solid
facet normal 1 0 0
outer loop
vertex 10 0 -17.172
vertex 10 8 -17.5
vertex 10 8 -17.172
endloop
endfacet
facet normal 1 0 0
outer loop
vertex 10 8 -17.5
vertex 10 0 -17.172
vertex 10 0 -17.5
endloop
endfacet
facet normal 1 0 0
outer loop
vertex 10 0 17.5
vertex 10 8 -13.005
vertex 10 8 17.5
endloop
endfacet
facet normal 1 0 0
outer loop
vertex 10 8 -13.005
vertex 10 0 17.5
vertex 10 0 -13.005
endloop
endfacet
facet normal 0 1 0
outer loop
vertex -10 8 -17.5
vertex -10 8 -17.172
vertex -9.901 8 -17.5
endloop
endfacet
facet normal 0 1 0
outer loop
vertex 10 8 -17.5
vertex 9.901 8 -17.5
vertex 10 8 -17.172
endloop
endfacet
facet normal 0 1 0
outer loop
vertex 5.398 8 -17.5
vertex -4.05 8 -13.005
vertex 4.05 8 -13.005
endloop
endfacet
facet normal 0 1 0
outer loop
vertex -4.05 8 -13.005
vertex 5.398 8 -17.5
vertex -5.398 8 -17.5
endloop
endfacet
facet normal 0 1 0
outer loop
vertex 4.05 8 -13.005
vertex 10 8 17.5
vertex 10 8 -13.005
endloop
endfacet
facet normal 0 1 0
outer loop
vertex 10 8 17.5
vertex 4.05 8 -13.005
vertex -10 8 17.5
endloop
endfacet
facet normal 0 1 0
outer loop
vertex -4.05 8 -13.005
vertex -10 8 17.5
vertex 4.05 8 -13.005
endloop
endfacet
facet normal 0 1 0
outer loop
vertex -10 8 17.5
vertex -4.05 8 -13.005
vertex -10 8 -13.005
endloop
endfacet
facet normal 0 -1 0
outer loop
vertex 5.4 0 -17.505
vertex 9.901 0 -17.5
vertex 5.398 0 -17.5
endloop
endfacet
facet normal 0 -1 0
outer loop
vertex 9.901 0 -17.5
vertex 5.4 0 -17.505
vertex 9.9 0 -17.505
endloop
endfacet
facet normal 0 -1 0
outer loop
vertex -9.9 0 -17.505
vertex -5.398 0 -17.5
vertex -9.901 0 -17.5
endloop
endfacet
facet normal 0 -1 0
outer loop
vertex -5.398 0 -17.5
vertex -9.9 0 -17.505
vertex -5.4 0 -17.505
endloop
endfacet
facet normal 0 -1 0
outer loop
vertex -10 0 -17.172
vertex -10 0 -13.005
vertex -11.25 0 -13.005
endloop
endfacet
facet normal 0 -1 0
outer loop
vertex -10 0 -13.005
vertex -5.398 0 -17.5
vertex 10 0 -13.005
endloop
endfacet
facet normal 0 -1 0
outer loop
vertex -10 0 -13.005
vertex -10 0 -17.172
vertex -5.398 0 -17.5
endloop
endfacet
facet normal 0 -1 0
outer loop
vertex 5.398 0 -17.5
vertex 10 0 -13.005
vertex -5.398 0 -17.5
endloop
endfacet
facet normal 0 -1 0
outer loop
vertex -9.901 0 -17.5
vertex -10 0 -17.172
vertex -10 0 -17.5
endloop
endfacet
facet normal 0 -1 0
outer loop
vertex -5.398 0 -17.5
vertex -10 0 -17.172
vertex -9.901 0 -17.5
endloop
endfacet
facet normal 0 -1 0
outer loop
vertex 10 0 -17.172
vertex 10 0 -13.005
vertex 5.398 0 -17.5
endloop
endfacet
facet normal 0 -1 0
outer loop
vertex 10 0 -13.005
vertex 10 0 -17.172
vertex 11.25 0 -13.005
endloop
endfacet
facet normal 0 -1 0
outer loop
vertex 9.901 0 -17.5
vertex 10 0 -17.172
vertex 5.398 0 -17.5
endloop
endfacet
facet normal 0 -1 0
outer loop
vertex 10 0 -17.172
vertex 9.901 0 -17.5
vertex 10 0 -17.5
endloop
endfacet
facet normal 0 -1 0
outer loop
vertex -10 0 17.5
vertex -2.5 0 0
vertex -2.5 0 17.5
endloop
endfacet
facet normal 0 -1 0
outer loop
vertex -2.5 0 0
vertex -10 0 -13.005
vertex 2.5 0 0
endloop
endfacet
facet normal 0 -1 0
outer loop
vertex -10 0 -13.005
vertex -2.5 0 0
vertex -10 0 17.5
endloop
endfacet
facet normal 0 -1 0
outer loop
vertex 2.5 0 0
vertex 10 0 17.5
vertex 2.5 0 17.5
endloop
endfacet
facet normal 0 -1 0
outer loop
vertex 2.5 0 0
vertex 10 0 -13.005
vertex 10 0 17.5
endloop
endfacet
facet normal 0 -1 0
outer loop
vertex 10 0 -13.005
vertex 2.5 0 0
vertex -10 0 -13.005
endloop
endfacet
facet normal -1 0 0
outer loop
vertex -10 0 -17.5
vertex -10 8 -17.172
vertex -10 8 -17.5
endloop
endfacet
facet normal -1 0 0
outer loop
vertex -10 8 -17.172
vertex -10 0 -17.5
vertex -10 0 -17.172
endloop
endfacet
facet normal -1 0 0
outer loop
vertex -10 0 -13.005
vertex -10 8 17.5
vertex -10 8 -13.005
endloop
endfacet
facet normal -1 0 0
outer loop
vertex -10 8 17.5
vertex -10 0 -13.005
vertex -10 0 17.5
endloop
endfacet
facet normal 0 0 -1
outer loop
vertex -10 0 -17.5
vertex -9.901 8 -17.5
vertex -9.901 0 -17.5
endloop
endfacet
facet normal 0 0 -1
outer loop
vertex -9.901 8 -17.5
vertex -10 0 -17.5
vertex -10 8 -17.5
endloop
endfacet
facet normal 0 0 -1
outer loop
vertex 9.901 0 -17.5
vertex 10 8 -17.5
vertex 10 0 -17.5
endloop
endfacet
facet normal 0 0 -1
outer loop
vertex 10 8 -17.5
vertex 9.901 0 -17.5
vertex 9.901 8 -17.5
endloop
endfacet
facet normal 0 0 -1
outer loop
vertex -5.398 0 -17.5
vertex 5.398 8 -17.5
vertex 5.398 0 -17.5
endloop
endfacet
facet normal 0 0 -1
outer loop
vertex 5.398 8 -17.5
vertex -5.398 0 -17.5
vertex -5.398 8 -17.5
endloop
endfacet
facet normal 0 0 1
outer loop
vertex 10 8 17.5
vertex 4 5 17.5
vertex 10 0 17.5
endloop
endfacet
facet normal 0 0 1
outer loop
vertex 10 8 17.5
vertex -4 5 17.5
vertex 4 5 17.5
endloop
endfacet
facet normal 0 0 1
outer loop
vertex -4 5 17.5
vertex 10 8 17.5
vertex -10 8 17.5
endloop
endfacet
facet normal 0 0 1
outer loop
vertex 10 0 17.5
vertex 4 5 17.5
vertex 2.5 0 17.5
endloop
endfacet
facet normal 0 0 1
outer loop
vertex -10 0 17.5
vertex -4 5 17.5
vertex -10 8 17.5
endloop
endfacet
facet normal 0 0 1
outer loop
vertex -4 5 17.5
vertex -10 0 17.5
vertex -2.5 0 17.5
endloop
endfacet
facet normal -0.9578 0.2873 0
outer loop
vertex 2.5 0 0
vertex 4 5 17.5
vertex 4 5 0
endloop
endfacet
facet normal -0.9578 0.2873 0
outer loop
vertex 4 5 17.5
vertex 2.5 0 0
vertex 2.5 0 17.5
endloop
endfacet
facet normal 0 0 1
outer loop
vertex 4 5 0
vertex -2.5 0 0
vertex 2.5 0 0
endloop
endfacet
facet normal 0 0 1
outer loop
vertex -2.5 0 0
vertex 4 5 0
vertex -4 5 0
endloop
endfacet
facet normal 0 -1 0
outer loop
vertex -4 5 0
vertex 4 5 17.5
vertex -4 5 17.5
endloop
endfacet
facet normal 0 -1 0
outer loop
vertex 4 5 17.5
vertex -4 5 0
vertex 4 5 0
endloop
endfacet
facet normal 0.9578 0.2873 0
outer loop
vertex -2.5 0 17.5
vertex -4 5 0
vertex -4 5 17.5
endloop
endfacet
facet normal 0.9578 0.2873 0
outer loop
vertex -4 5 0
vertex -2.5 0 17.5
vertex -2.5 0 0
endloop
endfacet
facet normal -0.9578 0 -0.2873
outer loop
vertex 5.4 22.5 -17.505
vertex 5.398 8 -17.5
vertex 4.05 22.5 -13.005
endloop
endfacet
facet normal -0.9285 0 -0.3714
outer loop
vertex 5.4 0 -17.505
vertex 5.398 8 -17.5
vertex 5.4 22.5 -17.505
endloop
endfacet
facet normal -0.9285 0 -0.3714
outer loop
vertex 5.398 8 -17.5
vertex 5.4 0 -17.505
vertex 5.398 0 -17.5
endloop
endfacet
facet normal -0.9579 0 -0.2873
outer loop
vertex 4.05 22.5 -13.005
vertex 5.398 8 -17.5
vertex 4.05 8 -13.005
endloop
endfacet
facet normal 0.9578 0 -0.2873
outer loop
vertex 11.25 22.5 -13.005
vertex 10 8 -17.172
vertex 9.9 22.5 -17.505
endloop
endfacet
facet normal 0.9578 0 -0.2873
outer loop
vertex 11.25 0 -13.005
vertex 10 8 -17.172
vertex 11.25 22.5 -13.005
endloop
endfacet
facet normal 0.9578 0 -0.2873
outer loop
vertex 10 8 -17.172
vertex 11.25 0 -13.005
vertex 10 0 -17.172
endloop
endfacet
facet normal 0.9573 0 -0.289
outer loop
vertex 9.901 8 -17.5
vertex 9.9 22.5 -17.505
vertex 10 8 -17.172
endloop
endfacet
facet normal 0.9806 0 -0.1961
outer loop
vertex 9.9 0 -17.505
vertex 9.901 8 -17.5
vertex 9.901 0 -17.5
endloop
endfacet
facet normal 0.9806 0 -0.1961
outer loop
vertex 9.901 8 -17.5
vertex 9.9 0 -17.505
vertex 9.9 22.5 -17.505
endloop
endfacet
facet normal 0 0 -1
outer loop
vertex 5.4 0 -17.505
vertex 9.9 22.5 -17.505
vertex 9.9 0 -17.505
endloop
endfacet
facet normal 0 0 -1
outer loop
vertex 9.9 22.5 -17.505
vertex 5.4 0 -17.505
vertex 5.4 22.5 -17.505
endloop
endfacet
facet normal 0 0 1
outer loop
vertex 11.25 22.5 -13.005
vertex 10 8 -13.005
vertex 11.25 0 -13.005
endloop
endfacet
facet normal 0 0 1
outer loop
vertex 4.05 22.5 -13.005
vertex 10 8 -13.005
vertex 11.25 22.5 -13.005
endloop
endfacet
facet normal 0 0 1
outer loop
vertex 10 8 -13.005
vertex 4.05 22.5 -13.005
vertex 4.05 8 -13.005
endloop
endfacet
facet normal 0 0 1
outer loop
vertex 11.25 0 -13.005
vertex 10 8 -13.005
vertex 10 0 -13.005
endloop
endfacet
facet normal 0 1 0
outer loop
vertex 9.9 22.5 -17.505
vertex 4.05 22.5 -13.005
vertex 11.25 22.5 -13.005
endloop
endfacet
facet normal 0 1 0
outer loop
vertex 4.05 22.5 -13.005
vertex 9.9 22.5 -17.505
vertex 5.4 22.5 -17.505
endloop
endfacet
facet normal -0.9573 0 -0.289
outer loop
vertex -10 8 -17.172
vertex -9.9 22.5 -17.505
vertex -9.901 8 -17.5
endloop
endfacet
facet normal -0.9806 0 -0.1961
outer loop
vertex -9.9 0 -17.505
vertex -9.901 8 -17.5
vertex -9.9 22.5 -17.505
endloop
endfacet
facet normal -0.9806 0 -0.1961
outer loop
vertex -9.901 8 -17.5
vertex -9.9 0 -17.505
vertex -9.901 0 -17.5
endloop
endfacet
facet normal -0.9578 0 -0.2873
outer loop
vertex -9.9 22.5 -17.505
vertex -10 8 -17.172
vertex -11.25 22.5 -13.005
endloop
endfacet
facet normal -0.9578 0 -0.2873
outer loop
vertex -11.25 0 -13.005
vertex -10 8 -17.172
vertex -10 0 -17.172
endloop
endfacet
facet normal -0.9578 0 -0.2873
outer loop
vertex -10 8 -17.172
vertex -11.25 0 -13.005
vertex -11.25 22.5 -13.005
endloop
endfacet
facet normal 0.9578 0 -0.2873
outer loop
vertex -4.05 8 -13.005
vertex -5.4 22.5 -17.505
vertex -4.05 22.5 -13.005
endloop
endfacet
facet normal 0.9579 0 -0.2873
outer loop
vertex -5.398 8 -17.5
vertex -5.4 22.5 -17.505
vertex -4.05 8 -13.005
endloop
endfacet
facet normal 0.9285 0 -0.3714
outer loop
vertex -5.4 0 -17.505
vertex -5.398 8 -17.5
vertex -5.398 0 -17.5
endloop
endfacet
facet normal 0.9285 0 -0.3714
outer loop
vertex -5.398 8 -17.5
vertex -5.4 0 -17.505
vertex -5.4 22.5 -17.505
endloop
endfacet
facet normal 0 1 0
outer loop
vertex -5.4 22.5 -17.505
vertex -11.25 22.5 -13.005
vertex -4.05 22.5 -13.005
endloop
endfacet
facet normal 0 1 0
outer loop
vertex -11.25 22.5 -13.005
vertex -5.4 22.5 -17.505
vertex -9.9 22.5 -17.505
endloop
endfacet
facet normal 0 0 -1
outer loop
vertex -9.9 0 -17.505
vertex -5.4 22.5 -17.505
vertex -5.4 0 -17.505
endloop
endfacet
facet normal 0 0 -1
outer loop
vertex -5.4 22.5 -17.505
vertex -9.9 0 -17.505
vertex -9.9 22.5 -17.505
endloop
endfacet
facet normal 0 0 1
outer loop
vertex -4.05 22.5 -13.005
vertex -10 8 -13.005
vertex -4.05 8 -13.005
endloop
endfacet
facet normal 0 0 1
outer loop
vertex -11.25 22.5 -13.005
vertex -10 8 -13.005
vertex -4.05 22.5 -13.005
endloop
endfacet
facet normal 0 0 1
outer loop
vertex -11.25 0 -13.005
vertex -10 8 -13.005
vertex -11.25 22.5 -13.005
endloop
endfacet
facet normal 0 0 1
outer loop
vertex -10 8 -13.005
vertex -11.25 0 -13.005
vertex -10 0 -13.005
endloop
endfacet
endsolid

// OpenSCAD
// file: ../../include.scad
//////////////////      END SECTION       //////////////////

	module added_pins(){
		difference(){
			union(){
				translate([30/(15/4),obj_leg*leg_length,30/(15/4)]) pin();
				translate([30/(15/4)+14.5,obj_leg*leg_length,30/(15/4)+14]) pin();
			}
			union(){
							translate([30/(15/4)+13.5,obj_leg*leg_length-20,30/(15/4)+5])cube(size=[2,40,15]);
							translate([30/(15/4)+7.5,obj_leg*leg_length-20,30/(15/4)+15])rotate([0,90,0]) cube(size=[2,40,15]);	

							translate([30/(15/4)-1,obj_leg*leg_length-20,30/(15/4)-8])cube(size=[2,40,15]);
							translate([30/(15/4)-10,obj_leg*leg_length-20,30/(15/4)+1])rotate([0,90,0]) cube(size=[2,40,15]);
			}
		}
	}
	module taken_pins() {
		translate([30/(15/4)+14,obj_leg*leg_length-10,30/(15/4)]) mirror_pin();
		translate([30/(15/4),obj_leg*leg_length-10,30/(15/4)+15]) mirror_pin();
	}


//////////////////      OTHER STUFF       //////////////////

	module holes() {
		rotate([0,0,90]) for(y=[0:other_holes])
		translate([obj_leg+y*15,-15.5,7.5]) union() {
			translate([7.5,0,15]) hole_up();
			hole_down();
		}
	}
	module extend_holes() {
	module top(){
		rotate([0,0,90]) for(y=[0:other_holes+1])
		translate([(30/4)+y*15,-15.5,7.5]) union() {
			translate([7.5,0,15]) hole_up();
		}
	}
	module bottom(){
		rotate([0,0,90]) for(y=[0:other_holes+2])
		translate([(30/4)+y*15,-15.5,7.5]) union() {
			hole_down();
		
}
	}
	union(){
		top();
		bottom();
	}
	}

	module hole() {
		union() {
			rotate([90, 90, 0]) cylinder(h=40, d=hole_pin_diameter, center=true);
			translate([0,7.5,0]) sphere(d=hole_ball_size);
			translate([0,-6,0]) sphere(d=hole_ball_size);
		}
	}
	module hole_up() {
		union() {
			rotate([90, 90, 0]) cylinder(h=40, d=hole_pin_diameter, center=true);
			translate([0,7.5,10]) cylinder(h=hole_pin_height, d=hole_pin_diameter, center=true);
			translate([0,-6,10]) cylinder(h=hole_pin_height, d=hole_pin_diameter, center=true);
			translate([0,7.5,0]) sphere(d=hole_ball_size);
			translate([0,-6,0]) sphere(d=hole_ball_size);
		}
	}
	module hole_down() {
		union() {
			rotate([90, 90, 0]) cylinder(h=40, d=hole_pin_diameter, center=true);
			translate([0,7.5,-10]) cylinder(h=hole_pin_height, d=hole_pin_diameter, center=true);
			translate([0,-6,-10]) cylinder(h=hole_pin_height, d=hole_pin_diameter, center=true);
			translate([0,7.5,0]) sphere(d=hole_ball_size);
			translate([0,-6,0]) sphere(d=hole_ball_size);
		}
	}
	module pin() {
		union() {
			rotate([90, 90, 0]) cylinder(h=pin_height, d=pin_diameter, center=true);
			translate([0,7.5,0]) sphere(d=ball_size);
		}
	}

	module mirror_pin() {
		rotate([90, 90, 0]) cylinder(h=hole_pin_height+small_number, d=hole_pin_diameter, center=true);
		translate([0,-(pin_height-(ball_size/2)),0]) sphere(d=ball_size);
	}


//////////////////      SOME RACK AND Z THINGS       //////////////////

module z_holes() {
    rotate([0,-90,0]) for(z=[0:z_hole_number])
    translate([22.5+z*15,16,-12])
        hole();
}

module pin_cuts() {
	union(){
		cube(size=[2,10,40], center=true);
		rotate([0,0,90]) cube(size=[2,10,40], center=true);
	}
}
module pin_uncut() {
	union(){
		rotate([0, 0, 90]) cylinder(h=hole_pin_height, d=hole_pin_diameter, center=true);
		translate([0,0,10]) sphere(d=ball_hole);
	}
}


module pin_out() {
	union(){
		rotate([0, 0, 90]) cylinder(h=pin_height, d=pin_diameter, center=true);
		translate([0,0,10]) sphere(d= ball_size);
	}
}


module pins_z(){
	difference() {
		pin_out();
		pin_cuts();
	}
}
//////////////////      RACK AND SLIDE     ///////////////////

module straight_pins() {
	for(z=[0:((((obj_leg*leg_length)*2)-(obj_leg*2))/3)/14.5]) rotate([-90,0,0]) translate([z*15,30/(15/4),14]) pins_z();
	for(z=[0:((((obj_leg*leg_length)*2)-(obj_leg*2))/3)/14.5]) rotate([-90,0,0]) translate([z*15,30/(15/4)-14,14]) pins_z();
}
module stagger_pins() {
	for(z=[0:((((obj_leg*leg_length)*2)-(obj_leg*2))/3)/14.5]) rotate([-90,0,0]) translate([z*15,30/(15/4),14]) pins_z();
	for(z=[0:((((obj_leg*leg_length)*2)-(obj_leg*2))/3)/14.5]) rotate([-90,0,0]) translate([z*15+7,30/(15/4)-14,14]) pins_z();
}


//////////////////      DOVE TAIL       //////////////////

module male_dovetail(height) {
	dovetail_3d(max_width,min_width,depth,height);
}

module dovetail_3d(max_width=11, min_width=5, depth=5, height=30) {
	linear_extrude(height=height, convexity=2)
		dovetail_2d(max_width,min_width,depth);
}

module dovetail_2d(max_width=11, min_width=5, depth=5) {
	angle=atan((max_width/2-min_width/2)/depth);
	echo("angle: ", angle);
	polygon(paths=[[0,1,2,3,0]], points=[[-min_width/2,0], [-max_width/2,depth], [max_width/2, depth], [min_width/2,0]]);
}

//bow tie
	module tie_end(height){
				rotate([0,0,0]) translate([0,-0.01,((obj_leg/2)/2)]) male_dovetail(height);
				rotate([0,90,0]) translate([0,-0.01,((obj_leg/2)/2)]) male_dovetail(height);
				rotate([0,180,0]) translate([0,-0.01,((obj_leg/2)/2)]) male_dovetail(height);
				rotate([0,-90,0]) translate([0,-0.01,((obj_leg/2)/2)]) male_dovetail(height);
	}

module bow_support(){
	difference(){
		intersection(){
			translate([-15,0,-15]) cube([30,9,30]);
			scale([1.05,1.05,1.05]) rotate([0,45,0]) tie_end();
		}
		cube([29.2,29.2,29.2], center=true);
	}
}

	module wrap(units){
	for (y = [-1:units-2]) // two iterations, z = -1, z = 1
	{
			translate([15, (y*30)+15, 15]){
			for (r = [0:4]) // two iterations, z = -1, z = 1
			{
				rotate([0,r*90,0]) translate([0,15,15]) rotate([-90,0,0])male_dovetail(height=30);
			}
		}
	}
	}
// file: ../../globals.scad
/*
Most things in this file is represented as one millimeter, so keep that in mind while changing things.
Some of the setting are not mm but at variables that you can set, such as 2*x=2x and you are setting what x is.
I will try to specify when things are variables and not exact measurements.
*/

//Virindi settings
dovetail_male_width_scale = 0.98;
dovetail_male_height_scale = 0.91;

obj_leg = 30;
leg_length = 5.5;
small_number = 0.001;
metal_core_rode_global = 5;


///////////////// number of holes /////////////////////
z_hole_number = 8;
other_holes = 8;

///////////////// Pins /////////////////////

//pins that poke out
ball_size = 10;
pin_height = 20;
pin_diameter = 6;


//holes
hole_ball_size = ball_size;
hole_pin_height = pin_height;
hole_pin_diameter = pin_diameter;

///////////////// Z THINGS /////////////////////

berring_slot_width = 7.5;
berring_slot_depth = 6.5;
metal_core_rode = 5;

///////////////// X THINGS /////////////////////

//male dove tails
max_width=8;
min_width=5;
depth=5;
height=obj_leg/2;

//female dove tails, this is found on the y mounts
girl_max_width=11;
girl_min_width=5;
girl_depth=5;
girl_height=obj_leg;


///////////////// Y THINGS /////////////////////
/*
The Y is so normal that all of those global variables at the top should change all of the setting in it, this section is set her incase there are variables set in the future development of this project.
*/
// main file
include <../../globals.scad>;
include <../../include.scad>;

module main(){
	difference(){
		translate([0,0,4]) cube([20,35,8], center=true);
		#rotate([90,0,0]) translate([0,0,0]) male_dovetail(25);
	}

	scale([.9,.9,.9]) translate([8.5,19.45,0]) rotate([0,0,180]) male_dovetail(25);
	scale([.9,.9,.9]) translate([-8.5,19.45,0]) rotate([0,0,180]) male_dovetail(25);
}

rotate([-90,0,0]) main();
